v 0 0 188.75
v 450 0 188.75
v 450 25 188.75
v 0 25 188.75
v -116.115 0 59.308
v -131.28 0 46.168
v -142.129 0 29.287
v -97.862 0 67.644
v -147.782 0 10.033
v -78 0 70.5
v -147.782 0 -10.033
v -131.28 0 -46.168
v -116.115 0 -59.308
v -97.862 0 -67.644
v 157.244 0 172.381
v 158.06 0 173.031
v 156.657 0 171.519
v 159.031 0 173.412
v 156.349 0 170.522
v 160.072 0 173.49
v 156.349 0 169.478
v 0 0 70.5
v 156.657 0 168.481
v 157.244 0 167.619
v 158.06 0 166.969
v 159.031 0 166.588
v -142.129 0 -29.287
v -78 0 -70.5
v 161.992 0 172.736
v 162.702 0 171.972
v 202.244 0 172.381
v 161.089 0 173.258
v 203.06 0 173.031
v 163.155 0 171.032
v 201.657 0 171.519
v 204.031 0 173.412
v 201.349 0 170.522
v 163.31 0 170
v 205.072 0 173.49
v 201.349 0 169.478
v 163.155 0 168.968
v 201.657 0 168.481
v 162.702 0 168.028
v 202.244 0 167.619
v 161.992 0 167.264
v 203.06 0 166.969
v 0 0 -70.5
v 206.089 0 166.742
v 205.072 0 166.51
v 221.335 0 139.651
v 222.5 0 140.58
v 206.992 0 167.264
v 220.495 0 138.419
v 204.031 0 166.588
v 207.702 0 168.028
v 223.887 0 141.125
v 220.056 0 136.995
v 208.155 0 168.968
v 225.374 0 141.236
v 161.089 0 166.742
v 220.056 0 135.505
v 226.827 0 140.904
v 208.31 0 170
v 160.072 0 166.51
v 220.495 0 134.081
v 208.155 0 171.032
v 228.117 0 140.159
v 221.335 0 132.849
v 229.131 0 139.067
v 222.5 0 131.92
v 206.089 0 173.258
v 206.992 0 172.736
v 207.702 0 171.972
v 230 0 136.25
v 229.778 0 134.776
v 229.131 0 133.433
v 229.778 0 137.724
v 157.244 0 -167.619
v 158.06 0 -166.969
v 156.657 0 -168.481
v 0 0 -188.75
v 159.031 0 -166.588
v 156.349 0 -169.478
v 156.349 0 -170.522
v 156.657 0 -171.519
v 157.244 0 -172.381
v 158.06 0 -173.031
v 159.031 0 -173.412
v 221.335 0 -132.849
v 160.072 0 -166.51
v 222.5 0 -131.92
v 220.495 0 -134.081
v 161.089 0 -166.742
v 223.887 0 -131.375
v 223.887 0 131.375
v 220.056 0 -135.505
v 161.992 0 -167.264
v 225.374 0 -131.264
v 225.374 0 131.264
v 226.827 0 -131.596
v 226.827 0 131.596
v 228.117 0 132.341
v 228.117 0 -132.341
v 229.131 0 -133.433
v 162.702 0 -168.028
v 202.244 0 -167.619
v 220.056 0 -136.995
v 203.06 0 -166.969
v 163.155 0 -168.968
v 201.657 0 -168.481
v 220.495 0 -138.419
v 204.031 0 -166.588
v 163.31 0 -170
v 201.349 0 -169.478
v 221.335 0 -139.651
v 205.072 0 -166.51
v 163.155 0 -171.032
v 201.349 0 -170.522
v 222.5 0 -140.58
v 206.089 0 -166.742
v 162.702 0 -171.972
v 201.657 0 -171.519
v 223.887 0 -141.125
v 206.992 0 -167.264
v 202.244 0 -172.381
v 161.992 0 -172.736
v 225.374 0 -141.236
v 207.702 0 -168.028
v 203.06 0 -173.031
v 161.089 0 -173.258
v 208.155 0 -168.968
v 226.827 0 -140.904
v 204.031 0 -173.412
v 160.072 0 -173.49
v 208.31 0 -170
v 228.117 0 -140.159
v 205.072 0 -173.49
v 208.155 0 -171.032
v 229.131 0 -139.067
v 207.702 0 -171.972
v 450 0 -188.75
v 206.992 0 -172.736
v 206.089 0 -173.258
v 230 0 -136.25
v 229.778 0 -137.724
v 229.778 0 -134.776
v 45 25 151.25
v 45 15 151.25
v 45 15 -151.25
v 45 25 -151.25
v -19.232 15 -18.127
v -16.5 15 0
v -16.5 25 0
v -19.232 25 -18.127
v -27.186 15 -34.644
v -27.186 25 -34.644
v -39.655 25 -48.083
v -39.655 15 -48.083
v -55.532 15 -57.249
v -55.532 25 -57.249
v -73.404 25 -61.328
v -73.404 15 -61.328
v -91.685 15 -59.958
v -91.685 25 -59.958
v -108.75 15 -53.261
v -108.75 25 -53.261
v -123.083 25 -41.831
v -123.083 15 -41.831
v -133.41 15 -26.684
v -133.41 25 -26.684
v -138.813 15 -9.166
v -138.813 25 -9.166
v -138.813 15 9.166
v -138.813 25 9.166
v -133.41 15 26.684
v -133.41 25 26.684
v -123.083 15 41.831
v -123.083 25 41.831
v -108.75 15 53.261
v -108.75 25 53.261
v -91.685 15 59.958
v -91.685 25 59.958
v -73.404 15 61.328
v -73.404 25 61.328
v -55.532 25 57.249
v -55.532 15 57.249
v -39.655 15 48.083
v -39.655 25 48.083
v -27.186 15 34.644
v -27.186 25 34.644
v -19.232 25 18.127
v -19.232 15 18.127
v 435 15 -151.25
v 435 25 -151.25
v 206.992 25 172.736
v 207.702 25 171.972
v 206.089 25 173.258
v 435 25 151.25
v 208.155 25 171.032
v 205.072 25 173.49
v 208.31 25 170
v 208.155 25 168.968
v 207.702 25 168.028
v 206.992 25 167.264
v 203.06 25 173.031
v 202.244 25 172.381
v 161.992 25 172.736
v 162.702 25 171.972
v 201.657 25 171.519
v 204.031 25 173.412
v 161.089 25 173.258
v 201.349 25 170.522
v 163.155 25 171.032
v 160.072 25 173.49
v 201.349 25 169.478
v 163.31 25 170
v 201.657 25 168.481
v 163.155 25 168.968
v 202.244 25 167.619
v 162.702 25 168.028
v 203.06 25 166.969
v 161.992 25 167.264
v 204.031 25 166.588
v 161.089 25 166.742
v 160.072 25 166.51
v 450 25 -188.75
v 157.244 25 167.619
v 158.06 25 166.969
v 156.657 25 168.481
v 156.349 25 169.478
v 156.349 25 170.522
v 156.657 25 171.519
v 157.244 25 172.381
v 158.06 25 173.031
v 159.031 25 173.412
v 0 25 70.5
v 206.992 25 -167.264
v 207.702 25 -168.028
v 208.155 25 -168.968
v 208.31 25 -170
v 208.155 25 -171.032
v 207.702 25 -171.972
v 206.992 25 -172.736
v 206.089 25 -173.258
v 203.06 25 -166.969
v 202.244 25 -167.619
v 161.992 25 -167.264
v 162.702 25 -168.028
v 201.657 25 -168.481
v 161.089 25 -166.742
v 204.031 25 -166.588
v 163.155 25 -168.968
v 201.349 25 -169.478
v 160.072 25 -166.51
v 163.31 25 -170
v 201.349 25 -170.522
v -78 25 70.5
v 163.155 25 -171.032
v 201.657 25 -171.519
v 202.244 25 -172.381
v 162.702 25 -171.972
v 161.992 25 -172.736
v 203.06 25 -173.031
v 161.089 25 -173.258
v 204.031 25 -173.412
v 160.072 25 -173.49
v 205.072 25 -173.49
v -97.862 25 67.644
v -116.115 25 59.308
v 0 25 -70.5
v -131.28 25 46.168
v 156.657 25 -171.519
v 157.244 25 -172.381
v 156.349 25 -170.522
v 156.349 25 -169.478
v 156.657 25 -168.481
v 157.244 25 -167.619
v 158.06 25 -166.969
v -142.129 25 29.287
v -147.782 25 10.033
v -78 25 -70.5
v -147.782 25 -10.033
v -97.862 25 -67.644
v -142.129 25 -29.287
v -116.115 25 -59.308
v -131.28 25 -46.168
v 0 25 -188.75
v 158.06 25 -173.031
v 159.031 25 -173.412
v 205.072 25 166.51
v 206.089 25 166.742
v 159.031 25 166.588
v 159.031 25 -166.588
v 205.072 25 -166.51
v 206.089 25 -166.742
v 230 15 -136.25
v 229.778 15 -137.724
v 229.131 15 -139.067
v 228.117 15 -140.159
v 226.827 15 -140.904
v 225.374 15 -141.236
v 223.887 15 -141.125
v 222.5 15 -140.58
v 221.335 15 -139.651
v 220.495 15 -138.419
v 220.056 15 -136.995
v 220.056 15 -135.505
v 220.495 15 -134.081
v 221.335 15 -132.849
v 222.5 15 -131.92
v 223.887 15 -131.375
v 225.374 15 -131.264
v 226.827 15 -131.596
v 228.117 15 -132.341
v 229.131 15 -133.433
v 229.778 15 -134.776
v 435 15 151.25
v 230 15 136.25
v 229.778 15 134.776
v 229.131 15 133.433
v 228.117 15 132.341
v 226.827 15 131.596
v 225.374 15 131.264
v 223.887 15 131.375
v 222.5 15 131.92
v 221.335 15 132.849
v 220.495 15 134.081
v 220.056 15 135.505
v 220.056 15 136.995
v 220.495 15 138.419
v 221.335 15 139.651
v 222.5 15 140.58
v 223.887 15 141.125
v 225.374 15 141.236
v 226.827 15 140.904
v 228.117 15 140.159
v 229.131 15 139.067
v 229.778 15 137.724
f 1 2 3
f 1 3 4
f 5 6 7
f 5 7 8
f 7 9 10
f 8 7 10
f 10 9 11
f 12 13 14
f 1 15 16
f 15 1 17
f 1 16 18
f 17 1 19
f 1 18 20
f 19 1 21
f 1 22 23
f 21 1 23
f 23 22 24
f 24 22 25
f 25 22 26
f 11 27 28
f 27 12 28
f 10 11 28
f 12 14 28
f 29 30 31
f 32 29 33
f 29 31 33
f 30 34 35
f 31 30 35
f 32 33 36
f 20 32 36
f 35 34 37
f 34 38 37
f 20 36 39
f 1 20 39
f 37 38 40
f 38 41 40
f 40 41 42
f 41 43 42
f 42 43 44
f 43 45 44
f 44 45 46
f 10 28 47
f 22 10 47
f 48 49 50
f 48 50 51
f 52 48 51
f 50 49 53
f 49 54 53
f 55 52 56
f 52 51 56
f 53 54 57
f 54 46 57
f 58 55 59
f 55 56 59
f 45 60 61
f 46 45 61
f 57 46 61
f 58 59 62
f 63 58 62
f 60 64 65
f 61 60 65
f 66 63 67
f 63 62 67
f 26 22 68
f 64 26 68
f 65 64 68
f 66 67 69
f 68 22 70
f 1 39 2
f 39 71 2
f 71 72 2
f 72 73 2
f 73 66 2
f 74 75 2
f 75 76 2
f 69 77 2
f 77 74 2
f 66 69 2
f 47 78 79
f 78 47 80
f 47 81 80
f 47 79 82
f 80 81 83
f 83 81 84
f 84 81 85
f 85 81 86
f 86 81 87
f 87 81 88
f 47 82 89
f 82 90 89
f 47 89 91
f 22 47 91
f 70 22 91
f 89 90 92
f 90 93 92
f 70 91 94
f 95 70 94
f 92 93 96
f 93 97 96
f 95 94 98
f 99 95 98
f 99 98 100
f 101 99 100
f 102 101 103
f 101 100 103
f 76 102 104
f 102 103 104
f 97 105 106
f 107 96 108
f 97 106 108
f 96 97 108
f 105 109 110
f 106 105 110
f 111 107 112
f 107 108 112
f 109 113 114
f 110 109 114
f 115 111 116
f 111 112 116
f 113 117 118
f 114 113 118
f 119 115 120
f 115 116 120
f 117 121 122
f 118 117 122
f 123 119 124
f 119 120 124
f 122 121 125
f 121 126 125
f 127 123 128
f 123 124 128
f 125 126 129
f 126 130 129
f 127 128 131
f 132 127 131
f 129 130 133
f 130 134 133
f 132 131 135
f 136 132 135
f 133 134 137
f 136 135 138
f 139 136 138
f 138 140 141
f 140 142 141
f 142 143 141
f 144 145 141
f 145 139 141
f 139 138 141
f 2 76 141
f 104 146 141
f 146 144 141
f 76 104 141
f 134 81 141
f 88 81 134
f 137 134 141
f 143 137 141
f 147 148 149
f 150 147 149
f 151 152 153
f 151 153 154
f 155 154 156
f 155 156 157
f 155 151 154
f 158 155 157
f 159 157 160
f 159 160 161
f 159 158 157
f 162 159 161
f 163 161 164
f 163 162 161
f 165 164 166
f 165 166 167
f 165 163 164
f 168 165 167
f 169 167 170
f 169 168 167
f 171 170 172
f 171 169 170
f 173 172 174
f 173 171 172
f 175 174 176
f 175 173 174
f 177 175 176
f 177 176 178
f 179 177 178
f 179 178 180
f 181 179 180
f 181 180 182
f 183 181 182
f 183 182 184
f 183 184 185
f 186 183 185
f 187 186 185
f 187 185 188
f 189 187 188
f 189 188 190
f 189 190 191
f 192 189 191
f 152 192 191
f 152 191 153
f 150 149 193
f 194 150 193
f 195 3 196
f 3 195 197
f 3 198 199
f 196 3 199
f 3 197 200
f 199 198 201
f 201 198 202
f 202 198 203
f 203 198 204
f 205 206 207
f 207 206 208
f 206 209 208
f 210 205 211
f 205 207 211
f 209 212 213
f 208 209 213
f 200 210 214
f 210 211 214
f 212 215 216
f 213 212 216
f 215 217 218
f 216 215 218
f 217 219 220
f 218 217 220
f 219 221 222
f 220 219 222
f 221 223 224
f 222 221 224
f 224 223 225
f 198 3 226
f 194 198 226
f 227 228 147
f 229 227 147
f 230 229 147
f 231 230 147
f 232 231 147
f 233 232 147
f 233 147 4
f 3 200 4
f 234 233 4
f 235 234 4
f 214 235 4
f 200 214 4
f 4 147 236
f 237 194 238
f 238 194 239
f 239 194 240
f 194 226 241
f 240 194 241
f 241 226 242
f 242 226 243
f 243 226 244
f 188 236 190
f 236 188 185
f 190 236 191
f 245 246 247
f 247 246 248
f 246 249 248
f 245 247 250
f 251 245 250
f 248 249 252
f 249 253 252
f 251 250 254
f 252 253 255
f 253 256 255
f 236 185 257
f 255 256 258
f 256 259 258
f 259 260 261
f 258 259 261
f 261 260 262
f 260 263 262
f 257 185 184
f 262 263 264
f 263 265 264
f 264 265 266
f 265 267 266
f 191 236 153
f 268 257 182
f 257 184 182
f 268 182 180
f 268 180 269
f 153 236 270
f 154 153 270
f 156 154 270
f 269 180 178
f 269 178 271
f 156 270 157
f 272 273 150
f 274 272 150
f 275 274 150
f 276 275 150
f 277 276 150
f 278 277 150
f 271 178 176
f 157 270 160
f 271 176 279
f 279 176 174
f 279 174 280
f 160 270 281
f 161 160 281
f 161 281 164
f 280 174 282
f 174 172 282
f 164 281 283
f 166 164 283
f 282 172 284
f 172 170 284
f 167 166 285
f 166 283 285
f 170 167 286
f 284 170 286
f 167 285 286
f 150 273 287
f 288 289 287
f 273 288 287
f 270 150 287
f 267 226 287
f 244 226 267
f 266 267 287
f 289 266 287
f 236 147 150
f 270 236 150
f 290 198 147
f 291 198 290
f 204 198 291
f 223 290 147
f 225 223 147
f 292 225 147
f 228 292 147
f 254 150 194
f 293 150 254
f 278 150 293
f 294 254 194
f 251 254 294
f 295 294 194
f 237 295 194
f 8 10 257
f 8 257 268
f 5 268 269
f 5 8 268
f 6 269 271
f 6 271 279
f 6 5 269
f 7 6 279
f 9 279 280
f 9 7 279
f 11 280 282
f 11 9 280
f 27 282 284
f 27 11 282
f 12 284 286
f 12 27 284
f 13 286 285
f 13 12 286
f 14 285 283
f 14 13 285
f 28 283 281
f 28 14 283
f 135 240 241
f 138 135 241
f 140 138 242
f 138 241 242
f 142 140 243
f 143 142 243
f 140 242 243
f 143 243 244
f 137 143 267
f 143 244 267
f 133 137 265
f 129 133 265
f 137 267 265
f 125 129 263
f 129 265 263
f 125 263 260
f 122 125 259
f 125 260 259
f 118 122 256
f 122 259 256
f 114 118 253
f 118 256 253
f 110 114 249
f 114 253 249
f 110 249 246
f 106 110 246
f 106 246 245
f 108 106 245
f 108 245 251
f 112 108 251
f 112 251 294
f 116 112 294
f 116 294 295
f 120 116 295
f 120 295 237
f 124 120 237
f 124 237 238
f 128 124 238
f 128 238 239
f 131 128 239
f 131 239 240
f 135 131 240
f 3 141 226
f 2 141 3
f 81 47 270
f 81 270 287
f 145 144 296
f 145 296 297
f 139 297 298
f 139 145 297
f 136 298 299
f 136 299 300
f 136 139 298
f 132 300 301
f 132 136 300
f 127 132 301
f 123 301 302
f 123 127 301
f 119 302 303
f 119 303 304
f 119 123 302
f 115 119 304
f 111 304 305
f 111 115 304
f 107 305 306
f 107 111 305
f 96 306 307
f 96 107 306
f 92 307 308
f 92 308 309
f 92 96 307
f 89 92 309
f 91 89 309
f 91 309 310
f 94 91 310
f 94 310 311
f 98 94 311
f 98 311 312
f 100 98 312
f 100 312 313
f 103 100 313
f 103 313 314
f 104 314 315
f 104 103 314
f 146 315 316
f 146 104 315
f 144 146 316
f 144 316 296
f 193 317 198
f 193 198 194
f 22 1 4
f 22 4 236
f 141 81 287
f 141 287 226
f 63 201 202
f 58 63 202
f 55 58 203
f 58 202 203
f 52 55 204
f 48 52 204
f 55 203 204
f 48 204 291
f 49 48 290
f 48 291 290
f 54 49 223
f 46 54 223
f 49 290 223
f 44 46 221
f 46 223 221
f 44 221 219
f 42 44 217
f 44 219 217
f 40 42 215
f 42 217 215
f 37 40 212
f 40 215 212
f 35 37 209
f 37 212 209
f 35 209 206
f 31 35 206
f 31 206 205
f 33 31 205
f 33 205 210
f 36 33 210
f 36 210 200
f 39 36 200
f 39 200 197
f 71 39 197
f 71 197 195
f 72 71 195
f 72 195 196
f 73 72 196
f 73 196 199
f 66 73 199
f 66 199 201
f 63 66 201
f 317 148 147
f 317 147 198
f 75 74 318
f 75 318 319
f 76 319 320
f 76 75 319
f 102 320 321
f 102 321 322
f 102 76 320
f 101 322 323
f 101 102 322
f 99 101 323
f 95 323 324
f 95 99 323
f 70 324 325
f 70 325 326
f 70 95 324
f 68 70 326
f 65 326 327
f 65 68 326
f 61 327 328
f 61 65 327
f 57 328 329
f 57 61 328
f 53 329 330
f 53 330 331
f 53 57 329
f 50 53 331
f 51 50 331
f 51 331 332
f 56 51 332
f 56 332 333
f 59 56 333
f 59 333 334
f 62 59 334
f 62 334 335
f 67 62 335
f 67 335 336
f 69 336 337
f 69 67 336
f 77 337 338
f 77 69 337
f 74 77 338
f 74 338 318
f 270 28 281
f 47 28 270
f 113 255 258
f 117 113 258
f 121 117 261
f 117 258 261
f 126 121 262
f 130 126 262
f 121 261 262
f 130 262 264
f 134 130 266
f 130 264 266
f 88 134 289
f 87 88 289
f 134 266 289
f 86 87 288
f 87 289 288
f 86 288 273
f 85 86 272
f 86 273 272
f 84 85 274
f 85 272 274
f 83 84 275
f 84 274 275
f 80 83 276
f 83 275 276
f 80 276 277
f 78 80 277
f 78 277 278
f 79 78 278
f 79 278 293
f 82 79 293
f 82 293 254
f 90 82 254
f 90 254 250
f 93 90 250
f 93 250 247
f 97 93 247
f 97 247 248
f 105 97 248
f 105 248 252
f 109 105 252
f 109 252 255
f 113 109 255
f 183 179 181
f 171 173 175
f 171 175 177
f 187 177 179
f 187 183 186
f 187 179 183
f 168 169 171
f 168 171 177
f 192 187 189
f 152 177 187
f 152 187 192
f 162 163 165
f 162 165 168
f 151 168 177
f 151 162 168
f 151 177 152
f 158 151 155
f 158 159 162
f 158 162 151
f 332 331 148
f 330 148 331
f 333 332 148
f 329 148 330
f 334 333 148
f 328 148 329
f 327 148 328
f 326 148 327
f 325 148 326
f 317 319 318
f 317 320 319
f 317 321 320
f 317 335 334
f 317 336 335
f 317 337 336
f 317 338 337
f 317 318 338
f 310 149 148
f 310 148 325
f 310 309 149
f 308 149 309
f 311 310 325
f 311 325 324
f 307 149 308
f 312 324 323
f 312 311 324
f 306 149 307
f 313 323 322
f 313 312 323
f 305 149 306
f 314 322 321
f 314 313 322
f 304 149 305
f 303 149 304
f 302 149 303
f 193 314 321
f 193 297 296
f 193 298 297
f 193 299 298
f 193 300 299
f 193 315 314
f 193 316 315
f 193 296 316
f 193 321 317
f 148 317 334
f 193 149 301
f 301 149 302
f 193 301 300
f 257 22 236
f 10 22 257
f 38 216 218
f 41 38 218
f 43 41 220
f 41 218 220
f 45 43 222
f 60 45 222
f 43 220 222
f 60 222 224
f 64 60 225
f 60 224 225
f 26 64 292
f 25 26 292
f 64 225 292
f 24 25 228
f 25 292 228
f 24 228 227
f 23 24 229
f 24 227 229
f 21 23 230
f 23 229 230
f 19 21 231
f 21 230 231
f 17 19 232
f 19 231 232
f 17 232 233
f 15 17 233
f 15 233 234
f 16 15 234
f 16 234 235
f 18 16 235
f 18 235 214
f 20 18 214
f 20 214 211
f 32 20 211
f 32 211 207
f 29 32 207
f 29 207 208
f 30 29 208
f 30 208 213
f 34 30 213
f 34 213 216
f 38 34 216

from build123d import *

# Parameters (mm, degrees)
SKETCH1_R           = 61.5
SKETCH1_W           = 390
SKETCH1_H           = 302.5
BOSS_EXTRUDE1_DEPTH = 25
SKETCH1_4_W         = 390
SKETCH1_4_H         = 302.5
SKETCH1_4_R         = 5
SKETCH1_4_R_2       = 61.5
BOSS_EXTRUDE2_DEPTH = 15
SKETCH3_R           = 3.5
CUT_EXTRUDE1_DEPTH  = 26


with BuildPart() as part:
    # Sketch1 → Boss-Extrude1 (new body)
    with BuildSketch(Plane(origin=(0, 0, 0), x_dir=(1, 0, 0), z_dir=(0, 1, 0))):
        with BuildLine():
            Line((0, 188.75), (450, 188.75))
            Line((450, 188.75), (450, -188.75))
            Line((450, -188.75), (0, -188.75))
            Line((0, -188.75), (0, -70.5))
            Line((0, -70.5), (-78, -70.5))
            ThreePointArc((-78, -70.5), (-148.5, 0), (-78, 70.5))
            Line((-78, 70.5), (0, 70.5))
            Line((0, 70.5), (0, 188.75))
        make_face()
        with Locations((-78, 0)):
            Circle(SKETCH1_R, mode=Mode.SUBTRACT)
        with Locations((240, 0)):
            Rectangle(SKETCH1_W, SKETCH1_H, mode=Mode.SUBTRACT)
    extrude(amount=BOSS_EXTRUDE1_DEPTH)

    # Sketch1<4> → Boss-Extrude2 (add)
    with BuildSketch(Plane(origin=(0, 0, 0), x_dir=(1, 0, 0), z_dir=(0, 1, 0))):
        with Locations((240, 0)):
            Rectangle(SKETCH1_4_W, SKETCH1_4_H)
        with Locations((225, 136.25)):
            Circle(SKETCH1_4_R, mode=Mode.SUBTRACT)
        with Locations((225, -136.25)):
            Circle(SKETCH1_4_R, mode=Mode.SUBTRACT)
        with Locations((-78, 0)):
            Circle(SKETCH1_4_R_2)
    extrude(amount=BOSS_EXTRUDE2_DEPTH)

    # Sketch3 → Cut-Extrude1 (cut, through all)
    with BuildSketch(Plane(origin=(0, 25, 0), x_dir=(1, 0, 0), z_dir=(0, 1, 0))):
        with Locations((159.81, -170)):
            Circle(SKETCH3_R)
        with Locations((204.81, -170)):
            Circle(SKETCH3_R)
        with Locations((204.81, 170)):
            Circle(SKETCH3_R)
        with Locations((159.81, 170)):
            Circle(SKETCH3_R)
    extrude(amount=-CUT_EXTRUDE1_DEPTH, mode=Mode.SUBTRACT)


solid = part.part
